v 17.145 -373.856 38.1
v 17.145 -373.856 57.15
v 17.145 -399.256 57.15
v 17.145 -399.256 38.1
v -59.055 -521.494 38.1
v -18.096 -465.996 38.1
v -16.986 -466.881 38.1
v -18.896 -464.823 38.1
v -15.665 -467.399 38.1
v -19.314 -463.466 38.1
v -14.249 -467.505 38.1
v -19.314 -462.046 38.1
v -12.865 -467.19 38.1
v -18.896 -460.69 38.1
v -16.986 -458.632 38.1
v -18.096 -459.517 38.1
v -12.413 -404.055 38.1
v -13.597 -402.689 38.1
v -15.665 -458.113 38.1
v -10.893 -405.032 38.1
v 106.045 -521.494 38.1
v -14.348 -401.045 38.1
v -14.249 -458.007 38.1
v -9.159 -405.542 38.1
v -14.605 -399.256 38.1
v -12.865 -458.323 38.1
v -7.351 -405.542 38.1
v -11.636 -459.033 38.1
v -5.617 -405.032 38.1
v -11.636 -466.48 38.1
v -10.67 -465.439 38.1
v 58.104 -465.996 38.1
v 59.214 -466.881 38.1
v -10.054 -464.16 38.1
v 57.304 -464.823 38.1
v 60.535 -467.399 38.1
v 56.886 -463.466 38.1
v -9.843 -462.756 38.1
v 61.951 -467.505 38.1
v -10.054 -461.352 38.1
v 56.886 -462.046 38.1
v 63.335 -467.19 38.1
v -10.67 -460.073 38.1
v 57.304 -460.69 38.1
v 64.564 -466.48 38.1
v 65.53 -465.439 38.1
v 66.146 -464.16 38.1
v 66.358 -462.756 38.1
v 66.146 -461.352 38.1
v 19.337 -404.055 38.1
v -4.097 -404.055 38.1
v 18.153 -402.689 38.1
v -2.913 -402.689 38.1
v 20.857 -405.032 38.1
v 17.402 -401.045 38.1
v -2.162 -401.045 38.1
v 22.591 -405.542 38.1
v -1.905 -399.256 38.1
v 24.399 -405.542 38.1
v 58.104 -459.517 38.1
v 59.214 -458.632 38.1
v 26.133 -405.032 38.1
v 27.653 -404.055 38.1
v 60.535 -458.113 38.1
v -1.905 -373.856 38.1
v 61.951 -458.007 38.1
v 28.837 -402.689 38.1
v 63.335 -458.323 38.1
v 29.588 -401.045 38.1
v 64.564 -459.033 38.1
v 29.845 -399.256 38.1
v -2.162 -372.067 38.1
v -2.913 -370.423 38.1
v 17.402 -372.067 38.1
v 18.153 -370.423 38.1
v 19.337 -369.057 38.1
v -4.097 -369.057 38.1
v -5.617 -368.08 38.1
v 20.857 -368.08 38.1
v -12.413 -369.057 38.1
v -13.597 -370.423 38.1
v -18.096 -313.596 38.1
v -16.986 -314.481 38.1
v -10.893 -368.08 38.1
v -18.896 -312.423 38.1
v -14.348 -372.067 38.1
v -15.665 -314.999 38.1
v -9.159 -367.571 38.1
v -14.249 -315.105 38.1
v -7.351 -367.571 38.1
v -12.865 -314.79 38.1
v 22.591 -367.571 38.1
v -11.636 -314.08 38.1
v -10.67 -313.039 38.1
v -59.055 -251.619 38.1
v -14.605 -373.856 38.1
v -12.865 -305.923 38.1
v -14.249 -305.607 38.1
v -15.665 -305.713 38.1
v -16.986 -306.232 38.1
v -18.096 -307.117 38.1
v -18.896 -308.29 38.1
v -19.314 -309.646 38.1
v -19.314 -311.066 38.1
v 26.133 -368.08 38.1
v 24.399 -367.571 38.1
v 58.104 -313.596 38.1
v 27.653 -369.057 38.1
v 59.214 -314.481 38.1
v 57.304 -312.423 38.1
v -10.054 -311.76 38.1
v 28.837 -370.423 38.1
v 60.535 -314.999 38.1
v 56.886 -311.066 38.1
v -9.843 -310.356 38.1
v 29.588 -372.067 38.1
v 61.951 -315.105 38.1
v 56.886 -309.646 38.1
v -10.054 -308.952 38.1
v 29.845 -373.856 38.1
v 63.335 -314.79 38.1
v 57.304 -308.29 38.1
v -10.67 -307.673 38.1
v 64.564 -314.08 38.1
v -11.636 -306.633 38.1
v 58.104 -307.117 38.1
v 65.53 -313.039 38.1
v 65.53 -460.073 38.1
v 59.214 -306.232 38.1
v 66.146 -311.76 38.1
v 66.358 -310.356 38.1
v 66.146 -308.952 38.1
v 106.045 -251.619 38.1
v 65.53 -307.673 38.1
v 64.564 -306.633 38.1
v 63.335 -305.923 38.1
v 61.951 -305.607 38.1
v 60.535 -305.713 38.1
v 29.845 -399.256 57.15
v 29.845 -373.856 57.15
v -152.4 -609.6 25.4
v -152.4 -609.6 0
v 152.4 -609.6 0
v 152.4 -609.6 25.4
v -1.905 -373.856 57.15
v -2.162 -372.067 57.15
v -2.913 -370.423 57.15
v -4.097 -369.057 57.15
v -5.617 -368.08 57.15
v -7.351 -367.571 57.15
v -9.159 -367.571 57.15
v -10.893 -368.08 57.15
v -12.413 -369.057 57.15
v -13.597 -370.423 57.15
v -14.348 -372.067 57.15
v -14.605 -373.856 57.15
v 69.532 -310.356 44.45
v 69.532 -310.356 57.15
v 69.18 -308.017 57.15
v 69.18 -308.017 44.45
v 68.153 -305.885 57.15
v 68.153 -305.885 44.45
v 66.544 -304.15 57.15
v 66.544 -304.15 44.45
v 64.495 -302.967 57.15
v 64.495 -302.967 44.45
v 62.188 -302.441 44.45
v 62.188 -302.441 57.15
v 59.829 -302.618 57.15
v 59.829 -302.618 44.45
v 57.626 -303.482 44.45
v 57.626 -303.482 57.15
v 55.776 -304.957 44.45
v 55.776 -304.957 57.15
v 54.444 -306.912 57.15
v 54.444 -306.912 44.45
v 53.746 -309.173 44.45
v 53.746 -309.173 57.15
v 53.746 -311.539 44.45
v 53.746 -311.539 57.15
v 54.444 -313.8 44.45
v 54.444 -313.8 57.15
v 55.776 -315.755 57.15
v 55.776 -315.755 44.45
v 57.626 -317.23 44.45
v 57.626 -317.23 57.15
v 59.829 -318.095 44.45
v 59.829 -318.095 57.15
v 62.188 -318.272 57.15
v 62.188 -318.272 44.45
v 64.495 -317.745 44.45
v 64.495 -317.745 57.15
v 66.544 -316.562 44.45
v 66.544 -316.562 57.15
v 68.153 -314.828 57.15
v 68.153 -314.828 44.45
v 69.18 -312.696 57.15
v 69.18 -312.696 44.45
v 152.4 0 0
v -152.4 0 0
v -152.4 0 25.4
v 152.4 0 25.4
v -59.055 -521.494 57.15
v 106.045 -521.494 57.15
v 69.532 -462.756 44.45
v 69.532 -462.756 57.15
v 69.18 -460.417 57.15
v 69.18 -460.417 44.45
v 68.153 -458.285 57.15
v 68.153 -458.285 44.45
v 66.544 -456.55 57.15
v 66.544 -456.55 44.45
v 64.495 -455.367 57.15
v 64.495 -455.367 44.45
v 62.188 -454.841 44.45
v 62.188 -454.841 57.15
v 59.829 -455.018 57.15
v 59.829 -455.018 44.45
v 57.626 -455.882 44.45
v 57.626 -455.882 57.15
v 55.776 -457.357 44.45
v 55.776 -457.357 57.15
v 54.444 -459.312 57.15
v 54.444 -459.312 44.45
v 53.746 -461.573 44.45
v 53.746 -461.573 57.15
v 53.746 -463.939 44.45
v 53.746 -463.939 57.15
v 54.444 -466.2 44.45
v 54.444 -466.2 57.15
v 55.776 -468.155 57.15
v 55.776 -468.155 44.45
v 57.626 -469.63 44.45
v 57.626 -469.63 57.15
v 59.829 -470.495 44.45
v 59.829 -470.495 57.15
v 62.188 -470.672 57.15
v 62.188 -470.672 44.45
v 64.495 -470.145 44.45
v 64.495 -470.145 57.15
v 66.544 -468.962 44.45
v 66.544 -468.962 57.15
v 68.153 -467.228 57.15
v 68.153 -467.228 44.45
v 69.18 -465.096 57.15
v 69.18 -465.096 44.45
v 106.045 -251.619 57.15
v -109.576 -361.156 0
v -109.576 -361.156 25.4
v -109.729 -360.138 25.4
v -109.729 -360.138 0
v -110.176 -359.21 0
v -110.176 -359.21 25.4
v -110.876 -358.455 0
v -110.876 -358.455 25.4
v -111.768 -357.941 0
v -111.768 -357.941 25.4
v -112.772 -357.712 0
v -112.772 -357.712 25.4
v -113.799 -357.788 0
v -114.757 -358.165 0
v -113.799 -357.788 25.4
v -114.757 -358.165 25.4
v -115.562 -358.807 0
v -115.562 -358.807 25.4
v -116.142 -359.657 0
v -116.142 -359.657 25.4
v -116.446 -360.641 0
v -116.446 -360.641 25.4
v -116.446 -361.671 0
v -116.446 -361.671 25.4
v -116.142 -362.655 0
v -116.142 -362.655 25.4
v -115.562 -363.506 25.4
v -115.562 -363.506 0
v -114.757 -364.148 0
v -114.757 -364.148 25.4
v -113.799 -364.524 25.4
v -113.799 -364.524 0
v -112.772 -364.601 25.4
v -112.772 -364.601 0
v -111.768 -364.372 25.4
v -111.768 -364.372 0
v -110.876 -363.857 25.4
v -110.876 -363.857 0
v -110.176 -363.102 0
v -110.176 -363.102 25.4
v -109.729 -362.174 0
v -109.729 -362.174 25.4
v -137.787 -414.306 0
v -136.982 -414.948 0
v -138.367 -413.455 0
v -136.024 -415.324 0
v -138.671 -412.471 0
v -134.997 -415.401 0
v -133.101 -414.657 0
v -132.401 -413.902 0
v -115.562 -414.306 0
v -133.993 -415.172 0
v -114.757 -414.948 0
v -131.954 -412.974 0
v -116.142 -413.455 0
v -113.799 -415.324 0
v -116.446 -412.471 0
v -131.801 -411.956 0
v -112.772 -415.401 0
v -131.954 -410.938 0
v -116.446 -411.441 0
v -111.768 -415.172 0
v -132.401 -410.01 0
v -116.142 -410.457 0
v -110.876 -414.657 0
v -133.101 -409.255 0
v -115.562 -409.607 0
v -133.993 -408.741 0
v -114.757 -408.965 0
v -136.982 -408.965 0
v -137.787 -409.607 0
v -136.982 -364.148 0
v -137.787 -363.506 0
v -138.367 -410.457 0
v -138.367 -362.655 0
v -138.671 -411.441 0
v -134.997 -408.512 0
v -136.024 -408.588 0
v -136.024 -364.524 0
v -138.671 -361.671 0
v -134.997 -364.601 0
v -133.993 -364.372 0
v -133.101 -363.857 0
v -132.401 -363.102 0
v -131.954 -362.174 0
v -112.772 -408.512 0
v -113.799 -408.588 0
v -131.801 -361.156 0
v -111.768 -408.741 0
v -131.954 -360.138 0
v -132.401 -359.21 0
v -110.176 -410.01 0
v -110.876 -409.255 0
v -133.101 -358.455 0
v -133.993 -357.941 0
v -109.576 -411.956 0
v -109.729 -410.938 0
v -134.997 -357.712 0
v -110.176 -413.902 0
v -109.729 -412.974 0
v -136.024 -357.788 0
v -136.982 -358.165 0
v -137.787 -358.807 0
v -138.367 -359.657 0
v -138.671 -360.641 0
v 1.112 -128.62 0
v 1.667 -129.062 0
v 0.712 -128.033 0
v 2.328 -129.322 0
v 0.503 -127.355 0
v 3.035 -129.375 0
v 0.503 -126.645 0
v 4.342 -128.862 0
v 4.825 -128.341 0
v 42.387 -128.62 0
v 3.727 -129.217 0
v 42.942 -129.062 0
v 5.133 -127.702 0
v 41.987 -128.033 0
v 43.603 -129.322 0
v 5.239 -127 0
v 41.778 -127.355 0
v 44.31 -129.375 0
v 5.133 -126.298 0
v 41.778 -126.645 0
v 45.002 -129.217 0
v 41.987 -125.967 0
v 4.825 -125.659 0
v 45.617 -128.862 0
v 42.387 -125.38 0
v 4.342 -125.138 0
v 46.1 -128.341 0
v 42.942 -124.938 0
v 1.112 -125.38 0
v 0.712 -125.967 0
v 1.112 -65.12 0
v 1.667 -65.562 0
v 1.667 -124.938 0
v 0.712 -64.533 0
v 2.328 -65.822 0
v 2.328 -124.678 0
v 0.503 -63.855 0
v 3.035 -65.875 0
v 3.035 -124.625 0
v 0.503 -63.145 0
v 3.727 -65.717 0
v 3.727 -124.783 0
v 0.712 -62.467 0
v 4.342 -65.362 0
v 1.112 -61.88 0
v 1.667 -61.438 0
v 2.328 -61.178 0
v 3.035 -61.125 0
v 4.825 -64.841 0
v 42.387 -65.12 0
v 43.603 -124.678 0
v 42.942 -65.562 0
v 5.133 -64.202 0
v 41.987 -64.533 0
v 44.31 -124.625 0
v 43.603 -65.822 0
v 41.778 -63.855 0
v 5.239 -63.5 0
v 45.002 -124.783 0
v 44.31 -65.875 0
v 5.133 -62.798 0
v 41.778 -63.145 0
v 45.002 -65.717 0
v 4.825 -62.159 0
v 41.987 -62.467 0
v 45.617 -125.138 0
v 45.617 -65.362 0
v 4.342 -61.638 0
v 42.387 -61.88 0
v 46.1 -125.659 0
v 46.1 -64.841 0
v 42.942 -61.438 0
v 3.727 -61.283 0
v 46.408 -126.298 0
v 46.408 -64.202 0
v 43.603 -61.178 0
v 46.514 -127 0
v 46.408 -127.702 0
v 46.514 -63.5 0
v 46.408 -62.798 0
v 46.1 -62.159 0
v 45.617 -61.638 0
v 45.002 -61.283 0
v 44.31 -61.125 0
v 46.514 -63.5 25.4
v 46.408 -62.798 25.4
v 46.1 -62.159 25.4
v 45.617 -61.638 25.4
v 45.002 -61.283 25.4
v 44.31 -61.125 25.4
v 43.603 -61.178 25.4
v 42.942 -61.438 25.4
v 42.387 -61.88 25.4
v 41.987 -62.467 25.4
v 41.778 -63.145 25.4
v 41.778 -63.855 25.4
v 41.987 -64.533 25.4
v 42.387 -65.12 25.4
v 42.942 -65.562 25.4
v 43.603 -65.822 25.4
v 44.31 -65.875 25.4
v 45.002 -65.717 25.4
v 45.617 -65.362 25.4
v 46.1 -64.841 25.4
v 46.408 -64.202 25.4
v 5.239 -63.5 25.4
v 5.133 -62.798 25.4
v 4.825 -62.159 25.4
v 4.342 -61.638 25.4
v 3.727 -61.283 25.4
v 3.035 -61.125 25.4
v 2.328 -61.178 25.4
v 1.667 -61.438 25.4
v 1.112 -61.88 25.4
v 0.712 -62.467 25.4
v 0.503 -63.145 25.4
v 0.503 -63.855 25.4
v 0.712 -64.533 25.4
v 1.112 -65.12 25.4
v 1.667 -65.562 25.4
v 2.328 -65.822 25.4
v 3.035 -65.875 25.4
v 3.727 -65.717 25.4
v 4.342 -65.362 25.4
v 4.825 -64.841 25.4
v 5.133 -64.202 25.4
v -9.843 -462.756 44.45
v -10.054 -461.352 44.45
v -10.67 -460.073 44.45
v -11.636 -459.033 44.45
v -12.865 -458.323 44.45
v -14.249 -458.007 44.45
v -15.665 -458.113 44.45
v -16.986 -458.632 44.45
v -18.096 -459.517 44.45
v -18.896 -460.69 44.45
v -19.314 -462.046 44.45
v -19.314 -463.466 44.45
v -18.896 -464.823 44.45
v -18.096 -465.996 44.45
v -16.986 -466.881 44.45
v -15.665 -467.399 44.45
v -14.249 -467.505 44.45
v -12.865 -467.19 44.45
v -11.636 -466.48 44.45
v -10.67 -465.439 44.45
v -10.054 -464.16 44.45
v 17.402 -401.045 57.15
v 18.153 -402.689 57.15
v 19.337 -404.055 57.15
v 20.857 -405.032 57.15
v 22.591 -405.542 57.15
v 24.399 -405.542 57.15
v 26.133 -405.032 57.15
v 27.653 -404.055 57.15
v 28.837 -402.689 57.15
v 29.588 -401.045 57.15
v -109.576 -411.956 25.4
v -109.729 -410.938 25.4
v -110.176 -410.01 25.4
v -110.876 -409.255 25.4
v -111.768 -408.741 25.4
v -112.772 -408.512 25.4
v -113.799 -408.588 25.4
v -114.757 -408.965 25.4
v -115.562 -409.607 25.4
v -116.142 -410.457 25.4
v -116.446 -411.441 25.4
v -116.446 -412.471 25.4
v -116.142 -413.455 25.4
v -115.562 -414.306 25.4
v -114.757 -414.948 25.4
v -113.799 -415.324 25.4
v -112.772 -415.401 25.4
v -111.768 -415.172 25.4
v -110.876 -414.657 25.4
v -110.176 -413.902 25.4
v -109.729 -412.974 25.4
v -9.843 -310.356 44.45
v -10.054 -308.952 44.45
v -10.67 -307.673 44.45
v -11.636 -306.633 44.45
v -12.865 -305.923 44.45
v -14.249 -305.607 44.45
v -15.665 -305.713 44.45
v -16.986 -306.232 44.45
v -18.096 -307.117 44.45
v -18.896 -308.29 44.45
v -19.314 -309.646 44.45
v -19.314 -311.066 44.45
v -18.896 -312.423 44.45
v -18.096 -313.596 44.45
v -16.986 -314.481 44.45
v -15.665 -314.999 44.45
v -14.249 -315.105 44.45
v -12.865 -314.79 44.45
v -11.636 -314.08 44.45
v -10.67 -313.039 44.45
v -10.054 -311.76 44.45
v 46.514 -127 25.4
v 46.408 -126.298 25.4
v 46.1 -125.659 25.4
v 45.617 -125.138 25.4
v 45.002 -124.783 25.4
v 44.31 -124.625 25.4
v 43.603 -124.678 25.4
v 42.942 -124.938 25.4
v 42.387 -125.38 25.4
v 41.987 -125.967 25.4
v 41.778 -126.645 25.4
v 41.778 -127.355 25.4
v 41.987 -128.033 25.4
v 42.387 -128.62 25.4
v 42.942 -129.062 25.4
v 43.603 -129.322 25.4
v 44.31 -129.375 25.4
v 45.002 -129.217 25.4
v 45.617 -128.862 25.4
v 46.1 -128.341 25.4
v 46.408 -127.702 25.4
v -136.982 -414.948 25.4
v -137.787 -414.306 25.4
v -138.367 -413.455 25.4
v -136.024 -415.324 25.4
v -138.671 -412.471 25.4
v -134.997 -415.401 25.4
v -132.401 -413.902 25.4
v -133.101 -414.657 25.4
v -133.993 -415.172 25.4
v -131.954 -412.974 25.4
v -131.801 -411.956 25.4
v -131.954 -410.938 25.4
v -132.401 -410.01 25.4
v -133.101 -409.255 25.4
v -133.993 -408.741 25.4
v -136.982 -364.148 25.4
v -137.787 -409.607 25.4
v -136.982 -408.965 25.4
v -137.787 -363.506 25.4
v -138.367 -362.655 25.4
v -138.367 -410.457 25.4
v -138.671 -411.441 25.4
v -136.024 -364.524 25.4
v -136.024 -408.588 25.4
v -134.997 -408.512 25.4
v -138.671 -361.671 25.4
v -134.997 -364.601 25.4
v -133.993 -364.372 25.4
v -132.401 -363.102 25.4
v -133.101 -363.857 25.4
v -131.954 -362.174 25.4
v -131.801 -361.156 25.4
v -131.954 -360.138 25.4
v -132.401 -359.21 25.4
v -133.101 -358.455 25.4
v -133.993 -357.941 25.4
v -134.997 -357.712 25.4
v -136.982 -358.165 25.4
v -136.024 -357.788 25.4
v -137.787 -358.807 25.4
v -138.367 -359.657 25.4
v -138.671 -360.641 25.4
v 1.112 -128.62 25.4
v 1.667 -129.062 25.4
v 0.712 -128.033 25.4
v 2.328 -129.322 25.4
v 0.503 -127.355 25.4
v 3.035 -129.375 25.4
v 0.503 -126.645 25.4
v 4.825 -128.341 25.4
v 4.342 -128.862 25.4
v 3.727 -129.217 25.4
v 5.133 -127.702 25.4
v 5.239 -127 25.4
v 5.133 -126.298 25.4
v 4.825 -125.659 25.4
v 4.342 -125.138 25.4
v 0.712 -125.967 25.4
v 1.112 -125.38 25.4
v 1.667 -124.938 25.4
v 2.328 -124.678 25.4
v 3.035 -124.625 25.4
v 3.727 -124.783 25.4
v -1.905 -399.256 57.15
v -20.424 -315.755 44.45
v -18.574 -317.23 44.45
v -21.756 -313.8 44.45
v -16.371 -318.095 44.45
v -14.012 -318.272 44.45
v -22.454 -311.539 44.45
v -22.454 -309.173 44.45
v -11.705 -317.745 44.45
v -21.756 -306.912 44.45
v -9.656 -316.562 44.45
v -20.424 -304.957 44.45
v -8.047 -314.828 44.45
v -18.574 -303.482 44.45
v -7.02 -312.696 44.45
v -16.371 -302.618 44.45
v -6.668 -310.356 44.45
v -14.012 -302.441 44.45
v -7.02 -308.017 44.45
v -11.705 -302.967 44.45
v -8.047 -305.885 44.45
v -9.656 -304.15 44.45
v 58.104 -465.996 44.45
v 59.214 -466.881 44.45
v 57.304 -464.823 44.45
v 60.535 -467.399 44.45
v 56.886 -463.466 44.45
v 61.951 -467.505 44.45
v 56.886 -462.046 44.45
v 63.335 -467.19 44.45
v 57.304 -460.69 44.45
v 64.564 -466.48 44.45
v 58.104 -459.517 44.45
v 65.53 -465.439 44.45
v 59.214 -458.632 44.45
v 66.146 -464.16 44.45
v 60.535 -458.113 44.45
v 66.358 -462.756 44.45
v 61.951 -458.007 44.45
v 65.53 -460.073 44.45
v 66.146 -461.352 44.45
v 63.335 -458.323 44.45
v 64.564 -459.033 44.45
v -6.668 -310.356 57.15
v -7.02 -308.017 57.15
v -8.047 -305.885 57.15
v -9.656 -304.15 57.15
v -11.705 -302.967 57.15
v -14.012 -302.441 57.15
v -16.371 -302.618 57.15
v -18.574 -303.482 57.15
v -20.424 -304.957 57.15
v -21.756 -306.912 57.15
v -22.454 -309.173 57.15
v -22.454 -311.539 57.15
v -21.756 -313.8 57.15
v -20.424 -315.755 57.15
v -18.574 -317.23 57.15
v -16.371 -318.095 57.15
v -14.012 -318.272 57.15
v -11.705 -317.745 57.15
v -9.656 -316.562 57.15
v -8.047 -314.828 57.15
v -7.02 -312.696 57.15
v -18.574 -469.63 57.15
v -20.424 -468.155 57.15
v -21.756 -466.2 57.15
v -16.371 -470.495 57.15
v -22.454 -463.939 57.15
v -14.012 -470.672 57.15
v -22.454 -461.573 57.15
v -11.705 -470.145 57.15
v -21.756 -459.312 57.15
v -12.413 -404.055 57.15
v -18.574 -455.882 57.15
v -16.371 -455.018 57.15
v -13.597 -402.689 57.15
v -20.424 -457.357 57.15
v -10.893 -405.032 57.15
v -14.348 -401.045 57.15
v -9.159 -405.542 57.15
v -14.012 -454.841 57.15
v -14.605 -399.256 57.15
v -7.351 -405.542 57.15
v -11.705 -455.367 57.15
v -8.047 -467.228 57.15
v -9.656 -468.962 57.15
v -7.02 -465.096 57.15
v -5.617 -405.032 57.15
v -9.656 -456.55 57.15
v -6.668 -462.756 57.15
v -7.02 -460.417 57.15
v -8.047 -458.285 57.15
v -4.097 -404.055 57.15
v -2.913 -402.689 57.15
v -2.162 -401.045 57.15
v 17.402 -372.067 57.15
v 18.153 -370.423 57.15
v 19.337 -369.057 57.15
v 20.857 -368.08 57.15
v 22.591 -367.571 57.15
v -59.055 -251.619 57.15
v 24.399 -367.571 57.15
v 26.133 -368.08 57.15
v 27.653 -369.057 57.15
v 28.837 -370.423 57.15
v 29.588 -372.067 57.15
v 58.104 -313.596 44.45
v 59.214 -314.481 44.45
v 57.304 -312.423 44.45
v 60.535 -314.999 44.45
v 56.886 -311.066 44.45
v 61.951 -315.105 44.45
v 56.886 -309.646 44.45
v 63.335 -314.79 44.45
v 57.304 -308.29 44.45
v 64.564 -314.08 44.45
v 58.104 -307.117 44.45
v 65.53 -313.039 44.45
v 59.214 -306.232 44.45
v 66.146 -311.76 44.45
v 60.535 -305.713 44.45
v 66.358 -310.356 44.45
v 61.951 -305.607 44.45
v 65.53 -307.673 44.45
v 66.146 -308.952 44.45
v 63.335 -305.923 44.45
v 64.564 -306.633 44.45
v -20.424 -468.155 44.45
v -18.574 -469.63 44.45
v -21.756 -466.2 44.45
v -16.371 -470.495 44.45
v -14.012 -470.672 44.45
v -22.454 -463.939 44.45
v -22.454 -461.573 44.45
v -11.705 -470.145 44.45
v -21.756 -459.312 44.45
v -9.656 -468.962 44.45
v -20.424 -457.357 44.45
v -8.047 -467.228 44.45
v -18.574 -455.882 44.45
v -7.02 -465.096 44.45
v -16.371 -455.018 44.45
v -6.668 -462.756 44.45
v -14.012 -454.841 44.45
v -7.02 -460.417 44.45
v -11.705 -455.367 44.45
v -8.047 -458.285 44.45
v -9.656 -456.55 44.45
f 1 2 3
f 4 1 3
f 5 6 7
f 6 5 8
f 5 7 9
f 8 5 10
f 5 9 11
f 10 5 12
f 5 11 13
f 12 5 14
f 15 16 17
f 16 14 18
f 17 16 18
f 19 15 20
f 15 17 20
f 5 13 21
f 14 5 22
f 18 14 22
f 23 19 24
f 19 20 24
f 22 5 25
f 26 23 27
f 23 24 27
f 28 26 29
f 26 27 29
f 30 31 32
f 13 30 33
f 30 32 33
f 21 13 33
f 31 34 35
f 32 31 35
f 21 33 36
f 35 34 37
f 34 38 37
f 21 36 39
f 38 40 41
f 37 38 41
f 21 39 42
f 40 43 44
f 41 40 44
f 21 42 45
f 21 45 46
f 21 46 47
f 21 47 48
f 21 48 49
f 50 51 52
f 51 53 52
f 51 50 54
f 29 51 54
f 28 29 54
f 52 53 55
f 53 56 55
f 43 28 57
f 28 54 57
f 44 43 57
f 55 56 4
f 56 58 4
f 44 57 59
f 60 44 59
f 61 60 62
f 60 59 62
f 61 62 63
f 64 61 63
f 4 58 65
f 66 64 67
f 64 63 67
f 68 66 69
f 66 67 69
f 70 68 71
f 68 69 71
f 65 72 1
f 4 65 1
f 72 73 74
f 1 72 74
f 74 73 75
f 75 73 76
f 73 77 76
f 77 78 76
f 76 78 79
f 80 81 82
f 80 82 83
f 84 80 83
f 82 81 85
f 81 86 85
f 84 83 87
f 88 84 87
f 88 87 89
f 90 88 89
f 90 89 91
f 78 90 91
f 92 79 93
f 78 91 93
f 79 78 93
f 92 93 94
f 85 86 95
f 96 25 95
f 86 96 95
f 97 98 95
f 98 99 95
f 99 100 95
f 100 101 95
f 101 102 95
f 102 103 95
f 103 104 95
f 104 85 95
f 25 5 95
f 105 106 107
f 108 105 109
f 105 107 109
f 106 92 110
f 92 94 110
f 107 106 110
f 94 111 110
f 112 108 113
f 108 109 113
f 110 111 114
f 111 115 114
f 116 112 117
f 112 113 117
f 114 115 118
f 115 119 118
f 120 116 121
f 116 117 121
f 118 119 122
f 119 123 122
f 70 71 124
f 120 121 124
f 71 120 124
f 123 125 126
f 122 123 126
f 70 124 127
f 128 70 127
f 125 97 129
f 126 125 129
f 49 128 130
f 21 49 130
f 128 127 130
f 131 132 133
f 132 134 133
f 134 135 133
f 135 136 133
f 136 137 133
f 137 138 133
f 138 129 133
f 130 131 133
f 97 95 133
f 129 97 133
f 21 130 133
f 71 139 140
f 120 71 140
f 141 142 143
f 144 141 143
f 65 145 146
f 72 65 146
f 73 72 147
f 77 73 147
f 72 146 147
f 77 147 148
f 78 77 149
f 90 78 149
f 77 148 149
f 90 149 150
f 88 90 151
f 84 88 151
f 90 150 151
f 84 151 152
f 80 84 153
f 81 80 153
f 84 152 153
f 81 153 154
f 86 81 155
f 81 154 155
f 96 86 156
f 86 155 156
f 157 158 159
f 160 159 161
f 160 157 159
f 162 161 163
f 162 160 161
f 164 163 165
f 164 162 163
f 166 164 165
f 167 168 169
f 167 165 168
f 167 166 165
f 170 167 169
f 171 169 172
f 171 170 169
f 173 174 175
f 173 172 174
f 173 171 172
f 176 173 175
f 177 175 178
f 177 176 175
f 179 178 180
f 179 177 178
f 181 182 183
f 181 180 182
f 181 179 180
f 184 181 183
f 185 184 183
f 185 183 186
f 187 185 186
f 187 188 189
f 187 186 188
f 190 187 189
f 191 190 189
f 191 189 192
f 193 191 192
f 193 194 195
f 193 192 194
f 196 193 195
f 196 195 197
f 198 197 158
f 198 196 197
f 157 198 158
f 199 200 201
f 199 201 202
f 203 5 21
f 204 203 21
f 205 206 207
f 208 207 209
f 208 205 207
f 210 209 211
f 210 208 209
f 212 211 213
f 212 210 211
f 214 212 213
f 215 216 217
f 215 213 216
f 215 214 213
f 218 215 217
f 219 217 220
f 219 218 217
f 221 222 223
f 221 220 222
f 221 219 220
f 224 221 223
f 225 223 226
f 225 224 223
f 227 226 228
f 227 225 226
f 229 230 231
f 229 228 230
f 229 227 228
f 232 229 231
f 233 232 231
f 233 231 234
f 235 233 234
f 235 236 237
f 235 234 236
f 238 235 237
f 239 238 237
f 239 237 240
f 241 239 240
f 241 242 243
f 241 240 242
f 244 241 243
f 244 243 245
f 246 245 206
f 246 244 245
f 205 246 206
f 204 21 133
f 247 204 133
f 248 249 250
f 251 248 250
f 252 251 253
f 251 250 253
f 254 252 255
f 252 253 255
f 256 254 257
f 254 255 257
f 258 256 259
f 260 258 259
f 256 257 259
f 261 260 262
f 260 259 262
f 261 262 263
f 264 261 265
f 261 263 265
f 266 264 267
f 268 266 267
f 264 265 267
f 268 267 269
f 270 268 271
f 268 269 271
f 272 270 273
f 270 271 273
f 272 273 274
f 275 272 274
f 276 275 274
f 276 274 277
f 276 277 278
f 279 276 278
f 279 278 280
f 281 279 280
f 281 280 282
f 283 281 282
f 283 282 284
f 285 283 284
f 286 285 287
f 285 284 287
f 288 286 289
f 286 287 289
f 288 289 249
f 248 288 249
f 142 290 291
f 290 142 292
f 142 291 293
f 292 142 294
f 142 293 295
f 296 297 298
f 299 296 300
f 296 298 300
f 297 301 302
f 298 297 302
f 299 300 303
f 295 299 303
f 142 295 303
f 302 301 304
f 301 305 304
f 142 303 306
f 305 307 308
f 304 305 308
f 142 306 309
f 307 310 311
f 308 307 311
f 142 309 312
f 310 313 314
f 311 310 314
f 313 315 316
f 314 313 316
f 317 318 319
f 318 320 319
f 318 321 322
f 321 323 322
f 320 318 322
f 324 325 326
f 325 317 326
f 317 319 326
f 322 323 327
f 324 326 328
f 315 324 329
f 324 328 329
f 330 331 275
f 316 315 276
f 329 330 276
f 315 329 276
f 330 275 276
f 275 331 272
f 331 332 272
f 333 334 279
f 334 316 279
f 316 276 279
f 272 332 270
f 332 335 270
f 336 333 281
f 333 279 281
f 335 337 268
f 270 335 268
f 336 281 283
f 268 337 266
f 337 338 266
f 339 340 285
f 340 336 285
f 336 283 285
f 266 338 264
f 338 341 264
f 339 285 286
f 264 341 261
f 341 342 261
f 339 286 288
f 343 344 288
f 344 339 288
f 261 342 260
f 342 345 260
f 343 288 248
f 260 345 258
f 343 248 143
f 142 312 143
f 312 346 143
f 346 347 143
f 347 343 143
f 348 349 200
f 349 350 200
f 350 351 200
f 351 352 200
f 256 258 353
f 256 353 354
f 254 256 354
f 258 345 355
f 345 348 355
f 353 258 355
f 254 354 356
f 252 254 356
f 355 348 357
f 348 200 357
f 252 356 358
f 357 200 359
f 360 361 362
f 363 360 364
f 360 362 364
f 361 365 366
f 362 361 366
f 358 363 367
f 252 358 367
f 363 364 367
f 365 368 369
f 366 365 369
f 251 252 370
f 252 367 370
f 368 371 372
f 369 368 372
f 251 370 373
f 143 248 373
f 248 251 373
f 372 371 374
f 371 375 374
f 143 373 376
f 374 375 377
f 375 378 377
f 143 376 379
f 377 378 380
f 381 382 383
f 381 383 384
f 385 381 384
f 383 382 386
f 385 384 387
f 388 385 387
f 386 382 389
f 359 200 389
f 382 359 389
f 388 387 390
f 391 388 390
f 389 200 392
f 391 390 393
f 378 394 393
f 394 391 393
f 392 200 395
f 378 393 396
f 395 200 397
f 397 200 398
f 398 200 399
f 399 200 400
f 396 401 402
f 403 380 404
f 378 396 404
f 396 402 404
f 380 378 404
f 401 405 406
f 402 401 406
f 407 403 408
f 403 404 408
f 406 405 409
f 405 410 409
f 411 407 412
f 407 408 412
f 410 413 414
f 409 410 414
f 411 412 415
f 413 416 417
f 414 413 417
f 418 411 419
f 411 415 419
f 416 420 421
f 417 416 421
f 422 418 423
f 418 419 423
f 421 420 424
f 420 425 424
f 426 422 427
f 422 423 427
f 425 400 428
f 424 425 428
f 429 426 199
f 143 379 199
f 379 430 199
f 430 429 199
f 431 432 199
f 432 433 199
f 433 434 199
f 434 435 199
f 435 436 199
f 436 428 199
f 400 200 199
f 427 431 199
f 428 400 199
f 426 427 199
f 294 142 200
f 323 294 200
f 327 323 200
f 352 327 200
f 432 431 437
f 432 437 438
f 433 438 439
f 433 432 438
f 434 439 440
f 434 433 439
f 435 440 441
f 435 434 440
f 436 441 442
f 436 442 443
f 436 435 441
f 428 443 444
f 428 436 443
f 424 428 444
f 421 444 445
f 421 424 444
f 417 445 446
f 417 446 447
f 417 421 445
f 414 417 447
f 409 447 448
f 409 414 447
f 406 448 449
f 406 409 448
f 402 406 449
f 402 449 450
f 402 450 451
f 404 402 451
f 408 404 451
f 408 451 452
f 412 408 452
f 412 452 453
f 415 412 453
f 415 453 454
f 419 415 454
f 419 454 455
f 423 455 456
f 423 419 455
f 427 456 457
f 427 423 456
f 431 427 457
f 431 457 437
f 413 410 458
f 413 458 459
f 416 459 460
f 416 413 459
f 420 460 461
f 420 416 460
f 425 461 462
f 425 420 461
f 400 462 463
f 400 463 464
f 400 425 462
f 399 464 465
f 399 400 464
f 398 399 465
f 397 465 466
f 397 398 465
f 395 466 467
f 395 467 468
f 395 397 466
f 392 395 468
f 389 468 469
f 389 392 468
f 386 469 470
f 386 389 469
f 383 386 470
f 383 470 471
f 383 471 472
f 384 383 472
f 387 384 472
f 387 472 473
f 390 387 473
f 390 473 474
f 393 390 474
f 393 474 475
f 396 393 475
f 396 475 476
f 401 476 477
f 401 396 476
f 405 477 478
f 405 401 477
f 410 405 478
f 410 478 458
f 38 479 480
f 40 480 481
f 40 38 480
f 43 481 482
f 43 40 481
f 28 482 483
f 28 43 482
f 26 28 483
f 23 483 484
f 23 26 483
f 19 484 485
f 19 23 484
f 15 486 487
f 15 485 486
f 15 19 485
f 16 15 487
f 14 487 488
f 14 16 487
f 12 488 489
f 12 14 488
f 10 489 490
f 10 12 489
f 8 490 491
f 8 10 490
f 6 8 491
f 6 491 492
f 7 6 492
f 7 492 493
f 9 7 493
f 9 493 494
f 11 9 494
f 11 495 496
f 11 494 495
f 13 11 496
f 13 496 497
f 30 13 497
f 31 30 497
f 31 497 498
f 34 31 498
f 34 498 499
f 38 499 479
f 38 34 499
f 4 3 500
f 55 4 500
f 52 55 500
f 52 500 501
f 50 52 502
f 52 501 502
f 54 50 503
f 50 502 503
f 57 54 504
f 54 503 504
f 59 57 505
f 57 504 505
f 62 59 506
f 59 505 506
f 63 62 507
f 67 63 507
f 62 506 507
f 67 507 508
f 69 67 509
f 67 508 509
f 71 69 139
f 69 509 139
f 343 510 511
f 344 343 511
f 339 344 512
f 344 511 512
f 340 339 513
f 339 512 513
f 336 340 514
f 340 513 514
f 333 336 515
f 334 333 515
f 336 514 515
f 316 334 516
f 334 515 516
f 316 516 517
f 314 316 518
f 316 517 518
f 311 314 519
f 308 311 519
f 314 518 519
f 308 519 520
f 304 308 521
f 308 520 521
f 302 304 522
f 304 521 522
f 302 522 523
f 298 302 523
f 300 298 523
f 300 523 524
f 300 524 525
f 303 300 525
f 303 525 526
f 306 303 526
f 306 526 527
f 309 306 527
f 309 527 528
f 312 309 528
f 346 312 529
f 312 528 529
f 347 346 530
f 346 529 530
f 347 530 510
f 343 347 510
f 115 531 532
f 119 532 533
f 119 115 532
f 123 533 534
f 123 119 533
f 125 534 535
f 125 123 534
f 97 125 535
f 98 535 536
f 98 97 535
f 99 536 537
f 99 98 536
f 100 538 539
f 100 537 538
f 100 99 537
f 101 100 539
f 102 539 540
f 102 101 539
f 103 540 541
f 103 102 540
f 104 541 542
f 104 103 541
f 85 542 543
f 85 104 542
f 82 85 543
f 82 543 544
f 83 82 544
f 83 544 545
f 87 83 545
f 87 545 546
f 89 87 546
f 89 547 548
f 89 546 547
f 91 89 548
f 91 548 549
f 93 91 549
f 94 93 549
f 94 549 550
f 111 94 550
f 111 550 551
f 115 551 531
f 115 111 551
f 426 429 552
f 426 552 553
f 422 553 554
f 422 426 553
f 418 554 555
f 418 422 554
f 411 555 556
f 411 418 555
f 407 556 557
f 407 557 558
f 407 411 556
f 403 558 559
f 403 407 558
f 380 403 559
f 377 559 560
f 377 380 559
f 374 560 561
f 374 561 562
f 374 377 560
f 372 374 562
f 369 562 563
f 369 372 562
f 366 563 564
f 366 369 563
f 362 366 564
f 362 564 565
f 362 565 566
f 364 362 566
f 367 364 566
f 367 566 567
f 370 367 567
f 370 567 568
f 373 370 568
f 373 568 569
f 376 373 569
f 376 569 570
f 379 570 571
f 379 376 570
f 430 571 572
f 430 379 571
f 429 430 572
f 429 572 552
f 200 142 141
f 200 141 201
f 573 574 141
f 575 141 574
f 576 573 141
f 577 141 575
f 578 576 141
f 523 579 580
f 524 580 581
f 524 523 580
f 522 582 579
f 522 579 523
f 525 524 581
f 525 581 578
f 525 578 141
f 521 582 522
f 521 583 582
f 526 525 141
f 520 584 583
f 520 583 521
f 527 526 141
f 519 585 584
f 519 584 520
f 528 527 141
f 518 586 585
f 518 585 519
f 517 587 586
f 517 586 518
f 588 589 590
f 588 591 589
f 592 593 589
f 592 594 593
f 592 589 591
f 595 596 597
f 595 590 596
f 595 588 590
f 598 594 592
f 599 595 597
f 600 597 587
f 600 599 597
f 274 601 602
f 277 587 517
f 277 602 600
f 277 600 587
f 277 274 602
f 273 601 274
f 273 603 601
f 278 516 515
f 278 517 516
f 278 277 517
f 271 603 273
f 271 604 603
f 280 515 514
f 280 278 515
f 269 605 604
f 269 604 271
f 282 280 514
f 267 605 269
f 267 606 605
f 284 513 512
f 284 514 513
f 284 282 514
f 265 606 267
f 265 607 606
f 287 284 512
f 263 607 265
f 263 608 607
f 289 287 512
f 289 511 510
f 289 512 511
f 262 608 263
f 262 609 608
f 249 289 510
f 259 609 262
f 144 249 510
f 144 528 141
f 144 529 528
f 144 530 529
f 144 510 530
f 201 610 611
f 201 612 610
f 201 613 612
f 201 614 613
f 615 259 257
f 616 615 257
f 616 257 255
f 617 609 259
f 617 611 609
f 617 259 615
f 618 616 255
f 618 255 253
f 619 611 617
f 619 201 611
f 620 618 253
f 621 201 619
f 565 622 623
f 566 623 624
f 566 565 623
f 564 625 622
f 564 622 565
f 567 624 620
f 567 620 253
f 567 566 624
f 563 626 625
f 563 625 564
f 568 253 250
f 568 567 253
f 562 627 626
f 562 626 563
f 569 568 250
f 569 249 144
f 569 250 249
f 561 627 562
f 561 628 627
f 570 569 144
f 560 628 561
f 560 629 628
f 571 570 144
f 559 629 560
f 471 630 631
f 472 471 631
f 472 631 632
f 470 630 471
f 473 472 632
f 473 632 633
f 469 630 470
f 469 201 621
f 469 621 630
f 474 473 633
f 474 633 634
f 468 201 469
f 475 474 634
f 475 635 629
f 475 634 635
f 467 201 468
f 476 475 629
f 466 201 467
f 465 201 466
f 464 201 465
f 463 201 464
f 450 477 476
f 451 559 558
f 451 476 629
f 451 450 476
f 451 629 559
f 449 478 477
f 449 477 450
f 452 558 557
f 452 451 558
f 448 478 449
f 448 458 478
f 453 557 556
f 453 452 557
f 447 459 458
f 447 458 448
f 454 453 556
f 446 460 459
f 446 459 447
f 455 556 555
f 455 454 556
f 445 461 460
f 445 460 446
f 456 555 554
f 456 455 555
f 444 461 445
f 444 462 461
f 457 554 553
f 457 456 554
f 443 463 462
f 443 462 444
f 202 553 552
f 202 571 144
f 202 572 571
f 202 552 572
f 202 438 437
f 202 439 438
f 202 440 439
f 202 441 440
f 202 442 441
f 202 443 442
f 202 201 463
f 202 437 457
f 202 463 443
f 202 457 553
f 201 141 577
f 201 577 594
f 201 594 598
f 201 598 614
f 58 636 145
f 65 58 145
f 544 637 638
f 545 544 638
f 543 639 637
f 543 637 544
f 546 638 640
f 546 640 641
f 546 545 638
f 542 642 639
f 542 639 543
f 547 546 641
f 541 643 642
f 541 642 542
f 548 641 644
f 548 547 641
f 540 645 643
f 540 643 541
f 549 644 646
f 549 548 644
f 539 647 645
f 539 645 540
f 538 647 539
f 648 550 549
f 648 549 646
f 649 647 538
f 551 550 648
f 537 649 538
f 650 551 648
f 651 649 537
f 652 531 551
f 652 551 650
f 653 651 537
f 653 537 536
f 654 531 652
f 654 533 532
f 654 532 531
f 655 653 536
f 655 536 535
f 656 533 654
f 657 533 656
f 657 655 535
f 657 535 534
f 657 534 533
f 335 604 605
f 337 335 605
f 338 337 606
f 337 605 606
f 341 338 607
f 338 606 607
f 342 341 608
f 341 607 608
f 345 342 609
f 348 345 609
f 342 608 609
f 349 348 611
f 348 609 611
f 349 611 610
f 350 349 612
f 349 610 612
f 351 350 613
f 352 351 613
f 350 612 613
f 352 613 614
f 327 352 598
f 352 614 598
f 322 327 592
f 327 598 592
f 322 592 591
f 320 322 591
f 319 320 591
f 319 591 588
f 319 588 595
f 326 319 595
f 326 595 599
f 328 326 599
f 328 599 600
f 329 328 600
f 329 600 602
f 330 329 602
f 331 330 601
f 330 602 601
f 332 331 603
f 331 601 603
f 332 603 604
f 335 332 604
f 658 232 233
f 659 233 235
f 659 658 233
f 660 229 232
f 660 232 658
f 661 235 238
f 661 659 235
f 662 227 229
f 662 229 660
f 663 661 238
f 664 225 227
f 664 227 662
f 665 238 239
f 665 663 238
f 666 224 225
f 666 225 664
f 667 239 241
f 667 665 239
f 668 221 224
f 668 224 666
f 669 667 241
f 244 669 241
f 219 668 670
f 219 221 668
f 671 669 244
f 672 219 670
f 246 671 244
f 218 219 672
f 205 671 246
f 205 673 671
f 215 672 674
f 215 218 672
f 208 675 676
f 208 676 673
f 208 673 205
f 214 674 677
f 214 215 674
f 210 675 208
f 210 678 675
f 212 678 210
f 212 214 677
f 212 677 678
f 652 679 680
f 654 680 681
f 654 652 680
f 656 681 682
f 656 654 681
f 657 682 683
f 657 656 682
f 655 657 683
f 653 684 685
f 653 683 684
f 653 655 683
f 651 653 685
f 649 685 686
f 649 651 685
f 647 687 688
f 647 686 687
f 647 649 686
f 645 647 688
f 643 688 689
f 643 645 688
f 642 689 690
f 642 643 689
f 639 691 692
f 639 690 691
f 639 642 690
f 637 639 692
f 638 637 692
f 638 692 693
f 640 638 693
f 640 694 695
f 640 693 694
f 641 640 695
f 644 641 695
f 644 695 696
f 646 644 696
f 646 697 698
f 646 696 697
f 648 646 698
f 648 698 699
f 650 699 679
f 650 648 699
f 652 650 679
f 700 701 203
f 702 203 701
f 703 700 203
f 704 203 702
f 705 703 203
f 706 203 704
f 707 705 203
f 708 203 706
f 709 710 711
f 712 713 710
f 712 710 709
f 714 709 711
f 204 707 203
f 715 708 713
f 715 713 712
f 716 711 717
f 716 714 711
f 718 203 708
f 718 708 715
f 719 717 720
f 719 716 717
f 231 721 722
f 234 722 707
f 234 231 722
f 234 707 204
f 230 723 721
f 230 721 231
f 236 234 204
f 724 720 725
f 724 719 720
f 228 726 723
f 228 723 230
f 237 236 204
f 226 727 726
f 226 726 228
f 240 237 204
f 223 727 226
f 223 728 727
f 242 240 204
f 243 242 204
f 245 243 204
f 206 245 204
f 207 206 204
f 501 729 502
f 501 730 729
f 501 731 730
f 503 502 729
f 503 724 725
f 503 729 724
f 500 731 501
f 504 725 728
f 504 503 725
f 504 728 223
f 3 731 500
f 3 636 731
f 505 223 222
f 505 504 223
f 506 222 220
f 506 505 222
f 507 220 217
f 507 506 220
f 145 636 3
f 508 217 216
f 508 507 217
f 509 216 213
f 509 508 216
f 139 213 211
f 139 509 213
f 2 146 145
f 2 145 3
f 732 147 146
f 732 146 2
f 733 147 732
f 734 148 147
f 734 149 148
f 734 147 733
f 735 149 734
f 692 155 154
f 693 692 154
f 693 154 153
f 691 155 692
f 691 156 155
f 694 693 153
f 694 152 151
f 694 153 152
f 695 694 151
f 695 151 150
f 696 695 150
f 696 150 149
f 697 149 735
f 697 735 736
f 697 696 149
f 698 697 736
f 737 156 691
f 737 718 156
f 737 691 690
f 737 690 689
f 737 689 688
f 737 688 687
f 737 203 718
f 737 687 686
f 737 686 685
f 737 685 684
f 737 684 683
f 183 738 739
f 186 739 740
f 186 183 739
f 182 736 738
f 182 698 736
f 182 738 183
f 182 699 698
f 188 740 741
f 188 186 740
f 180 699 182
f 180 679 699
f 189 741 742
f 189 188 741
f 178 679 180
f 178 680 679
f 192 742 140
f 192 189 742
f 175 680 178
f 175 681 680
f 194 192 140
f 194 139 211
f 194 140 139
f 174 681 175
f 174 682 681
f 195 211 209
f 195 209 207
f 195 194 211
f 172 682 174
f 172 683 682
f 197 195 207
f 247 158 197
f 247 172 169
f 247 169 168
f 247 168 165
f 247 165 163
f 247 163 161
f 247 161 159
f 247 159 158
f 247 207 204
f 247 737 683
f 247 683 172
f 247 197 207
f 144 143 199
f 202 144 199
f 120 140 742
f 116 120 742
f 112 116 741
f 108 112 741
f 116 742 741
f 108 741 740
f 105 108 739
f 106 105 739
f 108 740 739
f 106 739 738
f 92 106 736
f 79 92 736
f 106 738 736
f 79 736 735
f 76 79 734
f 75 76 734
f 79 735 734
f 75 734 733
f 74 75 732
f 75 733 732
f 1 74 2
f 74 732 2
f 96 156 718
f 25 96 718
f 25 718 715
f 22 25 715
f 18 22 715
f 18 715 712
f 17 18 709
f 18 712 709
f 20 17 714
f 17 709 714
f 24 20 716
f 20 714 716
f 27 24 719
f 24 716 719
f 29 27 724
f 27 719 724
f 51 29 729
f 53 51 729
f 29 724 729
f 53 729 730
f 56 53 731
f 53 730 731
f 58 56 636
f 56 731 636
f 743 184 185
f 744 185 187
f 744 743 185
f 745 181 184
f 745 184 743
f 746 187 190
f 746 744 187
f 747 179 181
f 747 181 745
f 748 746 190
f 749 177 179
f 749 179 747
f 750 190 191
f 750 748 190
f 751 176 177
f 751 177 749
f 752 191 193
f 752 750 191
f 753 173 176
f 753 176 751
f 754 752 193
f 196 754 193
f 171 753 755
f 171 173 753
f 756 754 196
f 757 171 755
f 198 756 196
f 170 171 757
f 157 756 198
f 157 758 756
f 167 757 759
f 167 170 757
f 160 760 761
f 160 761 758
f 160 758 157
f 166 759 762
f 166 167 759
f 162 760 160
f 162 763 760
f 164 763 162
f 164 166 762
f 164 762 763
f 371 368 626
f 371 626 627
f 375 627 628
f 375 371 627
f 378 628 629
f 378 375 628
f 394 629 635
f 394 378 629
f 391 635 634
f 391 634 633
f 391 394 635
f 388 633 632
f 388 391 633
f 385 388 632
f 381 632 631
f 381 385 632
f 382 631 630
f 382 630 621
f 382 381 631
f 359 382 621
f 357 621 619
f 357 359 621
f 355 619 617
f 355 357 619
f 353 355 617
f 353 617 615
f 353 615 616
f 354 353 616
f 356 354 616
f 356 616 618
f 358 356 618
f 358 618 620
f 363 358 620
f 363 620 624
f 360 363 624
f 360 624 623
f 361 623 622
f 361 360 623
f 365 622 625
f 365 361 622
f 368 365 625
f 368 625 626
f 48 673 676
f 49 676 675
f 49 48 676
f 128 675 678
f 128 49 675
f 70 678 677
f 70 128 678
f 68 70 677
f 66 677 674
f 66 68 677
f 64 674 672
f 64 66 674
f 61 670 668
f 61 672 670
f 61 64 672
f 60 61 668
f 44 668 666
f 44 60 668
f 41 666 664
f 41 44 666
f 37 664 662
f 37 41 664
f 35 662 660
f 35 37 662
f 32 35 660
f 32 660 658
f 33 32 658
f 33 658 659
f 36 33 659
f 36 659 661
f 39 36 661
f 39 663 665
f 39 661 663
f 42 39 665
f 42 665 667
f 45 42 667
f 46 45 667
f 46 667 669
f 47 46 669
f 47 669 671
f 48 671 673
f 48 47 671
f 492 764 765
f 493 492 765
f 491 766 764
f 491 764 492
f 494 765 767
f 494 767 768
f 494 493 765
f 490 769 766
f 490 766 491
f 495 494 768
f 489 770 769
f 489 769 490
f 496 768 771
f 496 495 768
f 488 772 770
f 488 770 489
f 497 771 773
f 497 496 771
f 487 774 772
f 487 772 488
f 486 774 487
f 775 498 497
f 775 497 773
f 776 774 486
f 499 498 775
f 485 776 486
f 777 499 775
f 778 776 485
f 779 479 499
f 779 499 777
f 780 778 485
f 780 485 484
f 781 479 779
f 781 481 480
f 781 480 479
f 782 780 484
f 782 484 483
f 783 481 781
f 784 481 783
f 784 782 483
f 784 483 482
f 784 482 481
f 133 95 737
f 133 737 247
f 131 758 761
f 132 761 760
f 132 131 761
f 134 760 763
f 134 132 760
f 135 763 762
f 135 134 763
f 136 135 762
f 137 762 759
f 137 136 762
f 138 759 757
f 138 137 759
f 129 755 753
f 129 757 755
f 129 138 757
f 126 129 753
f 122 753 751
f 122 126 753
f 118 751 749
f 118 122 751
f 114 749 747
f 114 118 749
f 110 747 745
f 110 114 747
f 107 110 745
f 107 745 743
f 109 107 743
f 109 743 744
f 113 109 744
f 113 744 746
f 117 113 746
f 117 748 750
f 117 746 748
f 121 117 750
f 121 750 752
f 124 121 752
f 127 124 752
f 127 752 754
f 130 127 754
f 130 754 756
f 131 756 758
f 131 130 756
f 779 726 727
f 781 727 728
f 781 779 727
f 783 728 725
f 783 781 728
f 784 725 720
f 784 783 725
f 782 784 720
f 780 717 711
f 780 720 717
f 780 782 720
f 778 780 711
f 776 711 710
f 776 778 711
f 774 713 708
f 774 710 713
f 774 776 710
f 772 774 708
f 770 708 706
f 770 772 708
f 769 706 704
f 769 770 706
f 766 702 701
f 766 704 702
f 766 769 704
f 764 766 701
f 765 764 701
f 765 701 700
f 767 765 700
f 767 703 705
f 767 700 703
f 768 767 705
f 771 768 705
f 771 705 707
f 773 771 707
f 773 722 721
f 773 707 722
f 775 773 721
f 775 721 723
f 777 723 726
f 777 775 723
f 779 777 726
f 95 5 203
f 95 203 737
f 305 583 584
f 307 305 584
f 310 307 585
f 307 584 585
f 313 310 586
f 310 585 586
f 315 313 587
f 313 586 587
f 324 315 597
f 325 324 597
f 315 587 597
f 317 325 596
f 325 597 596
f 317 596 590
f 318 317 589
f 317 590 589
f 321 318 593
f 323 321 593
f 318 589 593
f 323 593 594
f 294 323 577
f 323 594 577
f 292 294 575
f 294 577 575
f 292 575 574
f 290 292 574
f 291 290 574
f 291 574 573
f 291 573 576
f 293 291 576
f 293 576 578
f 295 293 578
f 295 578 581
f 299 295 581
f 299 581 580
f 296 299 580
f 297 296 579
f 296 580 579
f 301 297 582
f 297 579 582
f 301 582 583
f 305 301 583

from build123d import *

# Parameters (mm, degrees)
F0_W     = 304.8
F0_H     = 609.6
F0_R     = 2.38125
F1_DEPTH = 25.4
F2_R     = 3.4544
F3_DEPTH = 25.4
F4_START = 12.7
F2_W     = 165.1
F2_H     = 269.875
F2_R_2   = 7.9375
F2_R_3   = 4.7625
F4_DEPTH = 19.05
F5_START = 19.05
F5_DEPTH = 234.95
F7_DEPTH = 25.4


with BuildPart() as f1:
    # F0 (on Top) → F1 (new body)
    with BuildSketch(Plane.XY):
        with Locations((0, -304.8)):
            Rectangle(F0_W, F0_H)
        with Locations((2.8575, -127)):
            Circle(F0_R, mode=Mode.SUBTRACT)
        with Locations((44.1325, -127)):
            Circle(F0_R, mode=Mode.SUBTRACT)
        with Locations((2.8575, -63.5)):
            Circle(F0_R, mode=Mode.SUBTRACT)
        with Locations((44.1325, -63.5)):
            Circle(F0_R, mode=Mode.SUBTRACT)
    extrude(amount=F1_DEPTH)

    # F2 (on face) → F3 (cut)
    with BuildSketch(Plane.XY.offset(25.4)):
        with Locations((-135.255, -361.15625)):
            Circle(F2_R)
        with Locations((-113.03, -361.15625)):
            Circle(F2_R)
        with Locations((-113.03, -411.95625)):
            Circle(F2_R)
        with Locations((-135.255, -411.95625)):
            Circle(F2_R)
    extrude(amount=-F3_DEPTH, mode=Mode.SUBTRACT)


with BuildPart() as f4:
    # F2 (on face) → F4 (new body)
    with BuildSketch(Plane.XY.offset(25.4).offset(F4_START)):
        with Locations((23.495, -386.55625)):
            Rectangle(F2_W, F2_H)
        with Locations((-14.605, -462.75625)):
            Circle(F2_R_2, mode=Mode.SUBTRACT)
        with Locations((-14.605, -310.35625)):
            Circle(F2_R_2, mode=Mode.SUBTRACT)
        with Locations((61.595, -462.75625)):
            Circle(F2_R_2, mode=Mode.SUBTRACT)
        with Locations((61.595, -310.35625)):
            Circle(F2_R_2, mode=Mode.SUBTRACT)
        with Locations((-14.605, -310.35625)):
            Circle(F2_R_2)
        with Locations((-14.605, -310.35625)):
            Circle(F2_R_3, mode=Mode.SUBTRACT)
        with Locations((61.595, -310.35625)):
            Circle(F2_R_2)
        with Locations((61.595, -310.35625)):
            Circle(F2_R_3, mode=Mode.SUBTRACT)
        with Locations((-14.605, -462.75625)):
            Circle(F2_R_2)
        with Locations((-14.605, -462.75625)):
            Circle(F2_R_3, mode=Mode.SUBTRACT)
        with Locations((61.595, -462.75625)):
            Circle(F2_R_2)
        with Locations((61.595, -462.75625)):
            Circle(F2_R_3, mode=Mode.SUBTRACT)
    extrude(amount=F4_DEPTH)

    # F2 (on face) → F5 (cut)
    with BuildSketch(Plane.XY.offset(25.4).offset(F5_START)):
        with Locations((-14.605, -310.35625)):
            Circle(F2_R_2)
        with Locations((-14.605, -310.35625)):
            Circle(F2_R_3, mode=Mode.SUBTRACT)
        with Locations((-14.605, -310.35625)):
            Circle(F2_R_3)
        with Locations((61.595, -310.35625)):
            Circle(F2_R_2)
        with Locations((61.595, -310.35625)):
            Circle(F2_R_3, mode=Mode.SUBTRACT)
        with Locations((61.595, -310.35625)):
            Circle(F2_R_3)
        with Locations((-14.605, -462.75625)):
            Circle(F2_R_2)
        with Locations((-14.605, -462.75625)):
            Circle(F2_R_3, mode=Mode.SUBTRACT)
        with Locations((-14.605, -462.75625)):
            Circle(F2_R_3)
        with Locations((61.595, -462.75625)):
            Circle(F2_R_2)
        with Locations((61.595, -462.75625)):
            Circle(F2_R_3, mode=Mode.SUBTRACT)
        with Locations((61.595, -462.75625)):
            Circle(F2_R_3)
    extrude(amount=F5_DEPTH, mode=Mode.SUBTRACT)

    # F6 (on face) → F7 (cut)
    with BuildSketch(Plane.XY.offset(57.15)):
        with BuildLine():
            Line((-1.905, -399.25625), (-1.905, -373.85625))
            ThreePointArc((-1.905, -373.85625), (-8.255, -367.50625), (-14.605, -373.85625))
            Line((-14.605, -373.85625), (-14.605, -399.25625))
            ThreePointArc((-14.605, -399.25625), (-8.255, -405.60625), (-1.905, -399.25625))
        make_face()
        with BuildLine():
            Line((29.845, -399.25625), (29.845, -373.85625))
            ThreePointArc((29.845, -373.85625), (23.495, -367.50625), (17.145, -373.85625))
            Line((17.145, -373.85625), (17.145, -399.25625))
            ThreePointArc((17.145, -399.25625), (23.495, -405.60625), (29.845, -399.25625))
        make_face()
    extrude(amount=-F7_DEPTH, mode=Mode.SUBTRACT)


solid = Compound([f1.part, f4.part])
